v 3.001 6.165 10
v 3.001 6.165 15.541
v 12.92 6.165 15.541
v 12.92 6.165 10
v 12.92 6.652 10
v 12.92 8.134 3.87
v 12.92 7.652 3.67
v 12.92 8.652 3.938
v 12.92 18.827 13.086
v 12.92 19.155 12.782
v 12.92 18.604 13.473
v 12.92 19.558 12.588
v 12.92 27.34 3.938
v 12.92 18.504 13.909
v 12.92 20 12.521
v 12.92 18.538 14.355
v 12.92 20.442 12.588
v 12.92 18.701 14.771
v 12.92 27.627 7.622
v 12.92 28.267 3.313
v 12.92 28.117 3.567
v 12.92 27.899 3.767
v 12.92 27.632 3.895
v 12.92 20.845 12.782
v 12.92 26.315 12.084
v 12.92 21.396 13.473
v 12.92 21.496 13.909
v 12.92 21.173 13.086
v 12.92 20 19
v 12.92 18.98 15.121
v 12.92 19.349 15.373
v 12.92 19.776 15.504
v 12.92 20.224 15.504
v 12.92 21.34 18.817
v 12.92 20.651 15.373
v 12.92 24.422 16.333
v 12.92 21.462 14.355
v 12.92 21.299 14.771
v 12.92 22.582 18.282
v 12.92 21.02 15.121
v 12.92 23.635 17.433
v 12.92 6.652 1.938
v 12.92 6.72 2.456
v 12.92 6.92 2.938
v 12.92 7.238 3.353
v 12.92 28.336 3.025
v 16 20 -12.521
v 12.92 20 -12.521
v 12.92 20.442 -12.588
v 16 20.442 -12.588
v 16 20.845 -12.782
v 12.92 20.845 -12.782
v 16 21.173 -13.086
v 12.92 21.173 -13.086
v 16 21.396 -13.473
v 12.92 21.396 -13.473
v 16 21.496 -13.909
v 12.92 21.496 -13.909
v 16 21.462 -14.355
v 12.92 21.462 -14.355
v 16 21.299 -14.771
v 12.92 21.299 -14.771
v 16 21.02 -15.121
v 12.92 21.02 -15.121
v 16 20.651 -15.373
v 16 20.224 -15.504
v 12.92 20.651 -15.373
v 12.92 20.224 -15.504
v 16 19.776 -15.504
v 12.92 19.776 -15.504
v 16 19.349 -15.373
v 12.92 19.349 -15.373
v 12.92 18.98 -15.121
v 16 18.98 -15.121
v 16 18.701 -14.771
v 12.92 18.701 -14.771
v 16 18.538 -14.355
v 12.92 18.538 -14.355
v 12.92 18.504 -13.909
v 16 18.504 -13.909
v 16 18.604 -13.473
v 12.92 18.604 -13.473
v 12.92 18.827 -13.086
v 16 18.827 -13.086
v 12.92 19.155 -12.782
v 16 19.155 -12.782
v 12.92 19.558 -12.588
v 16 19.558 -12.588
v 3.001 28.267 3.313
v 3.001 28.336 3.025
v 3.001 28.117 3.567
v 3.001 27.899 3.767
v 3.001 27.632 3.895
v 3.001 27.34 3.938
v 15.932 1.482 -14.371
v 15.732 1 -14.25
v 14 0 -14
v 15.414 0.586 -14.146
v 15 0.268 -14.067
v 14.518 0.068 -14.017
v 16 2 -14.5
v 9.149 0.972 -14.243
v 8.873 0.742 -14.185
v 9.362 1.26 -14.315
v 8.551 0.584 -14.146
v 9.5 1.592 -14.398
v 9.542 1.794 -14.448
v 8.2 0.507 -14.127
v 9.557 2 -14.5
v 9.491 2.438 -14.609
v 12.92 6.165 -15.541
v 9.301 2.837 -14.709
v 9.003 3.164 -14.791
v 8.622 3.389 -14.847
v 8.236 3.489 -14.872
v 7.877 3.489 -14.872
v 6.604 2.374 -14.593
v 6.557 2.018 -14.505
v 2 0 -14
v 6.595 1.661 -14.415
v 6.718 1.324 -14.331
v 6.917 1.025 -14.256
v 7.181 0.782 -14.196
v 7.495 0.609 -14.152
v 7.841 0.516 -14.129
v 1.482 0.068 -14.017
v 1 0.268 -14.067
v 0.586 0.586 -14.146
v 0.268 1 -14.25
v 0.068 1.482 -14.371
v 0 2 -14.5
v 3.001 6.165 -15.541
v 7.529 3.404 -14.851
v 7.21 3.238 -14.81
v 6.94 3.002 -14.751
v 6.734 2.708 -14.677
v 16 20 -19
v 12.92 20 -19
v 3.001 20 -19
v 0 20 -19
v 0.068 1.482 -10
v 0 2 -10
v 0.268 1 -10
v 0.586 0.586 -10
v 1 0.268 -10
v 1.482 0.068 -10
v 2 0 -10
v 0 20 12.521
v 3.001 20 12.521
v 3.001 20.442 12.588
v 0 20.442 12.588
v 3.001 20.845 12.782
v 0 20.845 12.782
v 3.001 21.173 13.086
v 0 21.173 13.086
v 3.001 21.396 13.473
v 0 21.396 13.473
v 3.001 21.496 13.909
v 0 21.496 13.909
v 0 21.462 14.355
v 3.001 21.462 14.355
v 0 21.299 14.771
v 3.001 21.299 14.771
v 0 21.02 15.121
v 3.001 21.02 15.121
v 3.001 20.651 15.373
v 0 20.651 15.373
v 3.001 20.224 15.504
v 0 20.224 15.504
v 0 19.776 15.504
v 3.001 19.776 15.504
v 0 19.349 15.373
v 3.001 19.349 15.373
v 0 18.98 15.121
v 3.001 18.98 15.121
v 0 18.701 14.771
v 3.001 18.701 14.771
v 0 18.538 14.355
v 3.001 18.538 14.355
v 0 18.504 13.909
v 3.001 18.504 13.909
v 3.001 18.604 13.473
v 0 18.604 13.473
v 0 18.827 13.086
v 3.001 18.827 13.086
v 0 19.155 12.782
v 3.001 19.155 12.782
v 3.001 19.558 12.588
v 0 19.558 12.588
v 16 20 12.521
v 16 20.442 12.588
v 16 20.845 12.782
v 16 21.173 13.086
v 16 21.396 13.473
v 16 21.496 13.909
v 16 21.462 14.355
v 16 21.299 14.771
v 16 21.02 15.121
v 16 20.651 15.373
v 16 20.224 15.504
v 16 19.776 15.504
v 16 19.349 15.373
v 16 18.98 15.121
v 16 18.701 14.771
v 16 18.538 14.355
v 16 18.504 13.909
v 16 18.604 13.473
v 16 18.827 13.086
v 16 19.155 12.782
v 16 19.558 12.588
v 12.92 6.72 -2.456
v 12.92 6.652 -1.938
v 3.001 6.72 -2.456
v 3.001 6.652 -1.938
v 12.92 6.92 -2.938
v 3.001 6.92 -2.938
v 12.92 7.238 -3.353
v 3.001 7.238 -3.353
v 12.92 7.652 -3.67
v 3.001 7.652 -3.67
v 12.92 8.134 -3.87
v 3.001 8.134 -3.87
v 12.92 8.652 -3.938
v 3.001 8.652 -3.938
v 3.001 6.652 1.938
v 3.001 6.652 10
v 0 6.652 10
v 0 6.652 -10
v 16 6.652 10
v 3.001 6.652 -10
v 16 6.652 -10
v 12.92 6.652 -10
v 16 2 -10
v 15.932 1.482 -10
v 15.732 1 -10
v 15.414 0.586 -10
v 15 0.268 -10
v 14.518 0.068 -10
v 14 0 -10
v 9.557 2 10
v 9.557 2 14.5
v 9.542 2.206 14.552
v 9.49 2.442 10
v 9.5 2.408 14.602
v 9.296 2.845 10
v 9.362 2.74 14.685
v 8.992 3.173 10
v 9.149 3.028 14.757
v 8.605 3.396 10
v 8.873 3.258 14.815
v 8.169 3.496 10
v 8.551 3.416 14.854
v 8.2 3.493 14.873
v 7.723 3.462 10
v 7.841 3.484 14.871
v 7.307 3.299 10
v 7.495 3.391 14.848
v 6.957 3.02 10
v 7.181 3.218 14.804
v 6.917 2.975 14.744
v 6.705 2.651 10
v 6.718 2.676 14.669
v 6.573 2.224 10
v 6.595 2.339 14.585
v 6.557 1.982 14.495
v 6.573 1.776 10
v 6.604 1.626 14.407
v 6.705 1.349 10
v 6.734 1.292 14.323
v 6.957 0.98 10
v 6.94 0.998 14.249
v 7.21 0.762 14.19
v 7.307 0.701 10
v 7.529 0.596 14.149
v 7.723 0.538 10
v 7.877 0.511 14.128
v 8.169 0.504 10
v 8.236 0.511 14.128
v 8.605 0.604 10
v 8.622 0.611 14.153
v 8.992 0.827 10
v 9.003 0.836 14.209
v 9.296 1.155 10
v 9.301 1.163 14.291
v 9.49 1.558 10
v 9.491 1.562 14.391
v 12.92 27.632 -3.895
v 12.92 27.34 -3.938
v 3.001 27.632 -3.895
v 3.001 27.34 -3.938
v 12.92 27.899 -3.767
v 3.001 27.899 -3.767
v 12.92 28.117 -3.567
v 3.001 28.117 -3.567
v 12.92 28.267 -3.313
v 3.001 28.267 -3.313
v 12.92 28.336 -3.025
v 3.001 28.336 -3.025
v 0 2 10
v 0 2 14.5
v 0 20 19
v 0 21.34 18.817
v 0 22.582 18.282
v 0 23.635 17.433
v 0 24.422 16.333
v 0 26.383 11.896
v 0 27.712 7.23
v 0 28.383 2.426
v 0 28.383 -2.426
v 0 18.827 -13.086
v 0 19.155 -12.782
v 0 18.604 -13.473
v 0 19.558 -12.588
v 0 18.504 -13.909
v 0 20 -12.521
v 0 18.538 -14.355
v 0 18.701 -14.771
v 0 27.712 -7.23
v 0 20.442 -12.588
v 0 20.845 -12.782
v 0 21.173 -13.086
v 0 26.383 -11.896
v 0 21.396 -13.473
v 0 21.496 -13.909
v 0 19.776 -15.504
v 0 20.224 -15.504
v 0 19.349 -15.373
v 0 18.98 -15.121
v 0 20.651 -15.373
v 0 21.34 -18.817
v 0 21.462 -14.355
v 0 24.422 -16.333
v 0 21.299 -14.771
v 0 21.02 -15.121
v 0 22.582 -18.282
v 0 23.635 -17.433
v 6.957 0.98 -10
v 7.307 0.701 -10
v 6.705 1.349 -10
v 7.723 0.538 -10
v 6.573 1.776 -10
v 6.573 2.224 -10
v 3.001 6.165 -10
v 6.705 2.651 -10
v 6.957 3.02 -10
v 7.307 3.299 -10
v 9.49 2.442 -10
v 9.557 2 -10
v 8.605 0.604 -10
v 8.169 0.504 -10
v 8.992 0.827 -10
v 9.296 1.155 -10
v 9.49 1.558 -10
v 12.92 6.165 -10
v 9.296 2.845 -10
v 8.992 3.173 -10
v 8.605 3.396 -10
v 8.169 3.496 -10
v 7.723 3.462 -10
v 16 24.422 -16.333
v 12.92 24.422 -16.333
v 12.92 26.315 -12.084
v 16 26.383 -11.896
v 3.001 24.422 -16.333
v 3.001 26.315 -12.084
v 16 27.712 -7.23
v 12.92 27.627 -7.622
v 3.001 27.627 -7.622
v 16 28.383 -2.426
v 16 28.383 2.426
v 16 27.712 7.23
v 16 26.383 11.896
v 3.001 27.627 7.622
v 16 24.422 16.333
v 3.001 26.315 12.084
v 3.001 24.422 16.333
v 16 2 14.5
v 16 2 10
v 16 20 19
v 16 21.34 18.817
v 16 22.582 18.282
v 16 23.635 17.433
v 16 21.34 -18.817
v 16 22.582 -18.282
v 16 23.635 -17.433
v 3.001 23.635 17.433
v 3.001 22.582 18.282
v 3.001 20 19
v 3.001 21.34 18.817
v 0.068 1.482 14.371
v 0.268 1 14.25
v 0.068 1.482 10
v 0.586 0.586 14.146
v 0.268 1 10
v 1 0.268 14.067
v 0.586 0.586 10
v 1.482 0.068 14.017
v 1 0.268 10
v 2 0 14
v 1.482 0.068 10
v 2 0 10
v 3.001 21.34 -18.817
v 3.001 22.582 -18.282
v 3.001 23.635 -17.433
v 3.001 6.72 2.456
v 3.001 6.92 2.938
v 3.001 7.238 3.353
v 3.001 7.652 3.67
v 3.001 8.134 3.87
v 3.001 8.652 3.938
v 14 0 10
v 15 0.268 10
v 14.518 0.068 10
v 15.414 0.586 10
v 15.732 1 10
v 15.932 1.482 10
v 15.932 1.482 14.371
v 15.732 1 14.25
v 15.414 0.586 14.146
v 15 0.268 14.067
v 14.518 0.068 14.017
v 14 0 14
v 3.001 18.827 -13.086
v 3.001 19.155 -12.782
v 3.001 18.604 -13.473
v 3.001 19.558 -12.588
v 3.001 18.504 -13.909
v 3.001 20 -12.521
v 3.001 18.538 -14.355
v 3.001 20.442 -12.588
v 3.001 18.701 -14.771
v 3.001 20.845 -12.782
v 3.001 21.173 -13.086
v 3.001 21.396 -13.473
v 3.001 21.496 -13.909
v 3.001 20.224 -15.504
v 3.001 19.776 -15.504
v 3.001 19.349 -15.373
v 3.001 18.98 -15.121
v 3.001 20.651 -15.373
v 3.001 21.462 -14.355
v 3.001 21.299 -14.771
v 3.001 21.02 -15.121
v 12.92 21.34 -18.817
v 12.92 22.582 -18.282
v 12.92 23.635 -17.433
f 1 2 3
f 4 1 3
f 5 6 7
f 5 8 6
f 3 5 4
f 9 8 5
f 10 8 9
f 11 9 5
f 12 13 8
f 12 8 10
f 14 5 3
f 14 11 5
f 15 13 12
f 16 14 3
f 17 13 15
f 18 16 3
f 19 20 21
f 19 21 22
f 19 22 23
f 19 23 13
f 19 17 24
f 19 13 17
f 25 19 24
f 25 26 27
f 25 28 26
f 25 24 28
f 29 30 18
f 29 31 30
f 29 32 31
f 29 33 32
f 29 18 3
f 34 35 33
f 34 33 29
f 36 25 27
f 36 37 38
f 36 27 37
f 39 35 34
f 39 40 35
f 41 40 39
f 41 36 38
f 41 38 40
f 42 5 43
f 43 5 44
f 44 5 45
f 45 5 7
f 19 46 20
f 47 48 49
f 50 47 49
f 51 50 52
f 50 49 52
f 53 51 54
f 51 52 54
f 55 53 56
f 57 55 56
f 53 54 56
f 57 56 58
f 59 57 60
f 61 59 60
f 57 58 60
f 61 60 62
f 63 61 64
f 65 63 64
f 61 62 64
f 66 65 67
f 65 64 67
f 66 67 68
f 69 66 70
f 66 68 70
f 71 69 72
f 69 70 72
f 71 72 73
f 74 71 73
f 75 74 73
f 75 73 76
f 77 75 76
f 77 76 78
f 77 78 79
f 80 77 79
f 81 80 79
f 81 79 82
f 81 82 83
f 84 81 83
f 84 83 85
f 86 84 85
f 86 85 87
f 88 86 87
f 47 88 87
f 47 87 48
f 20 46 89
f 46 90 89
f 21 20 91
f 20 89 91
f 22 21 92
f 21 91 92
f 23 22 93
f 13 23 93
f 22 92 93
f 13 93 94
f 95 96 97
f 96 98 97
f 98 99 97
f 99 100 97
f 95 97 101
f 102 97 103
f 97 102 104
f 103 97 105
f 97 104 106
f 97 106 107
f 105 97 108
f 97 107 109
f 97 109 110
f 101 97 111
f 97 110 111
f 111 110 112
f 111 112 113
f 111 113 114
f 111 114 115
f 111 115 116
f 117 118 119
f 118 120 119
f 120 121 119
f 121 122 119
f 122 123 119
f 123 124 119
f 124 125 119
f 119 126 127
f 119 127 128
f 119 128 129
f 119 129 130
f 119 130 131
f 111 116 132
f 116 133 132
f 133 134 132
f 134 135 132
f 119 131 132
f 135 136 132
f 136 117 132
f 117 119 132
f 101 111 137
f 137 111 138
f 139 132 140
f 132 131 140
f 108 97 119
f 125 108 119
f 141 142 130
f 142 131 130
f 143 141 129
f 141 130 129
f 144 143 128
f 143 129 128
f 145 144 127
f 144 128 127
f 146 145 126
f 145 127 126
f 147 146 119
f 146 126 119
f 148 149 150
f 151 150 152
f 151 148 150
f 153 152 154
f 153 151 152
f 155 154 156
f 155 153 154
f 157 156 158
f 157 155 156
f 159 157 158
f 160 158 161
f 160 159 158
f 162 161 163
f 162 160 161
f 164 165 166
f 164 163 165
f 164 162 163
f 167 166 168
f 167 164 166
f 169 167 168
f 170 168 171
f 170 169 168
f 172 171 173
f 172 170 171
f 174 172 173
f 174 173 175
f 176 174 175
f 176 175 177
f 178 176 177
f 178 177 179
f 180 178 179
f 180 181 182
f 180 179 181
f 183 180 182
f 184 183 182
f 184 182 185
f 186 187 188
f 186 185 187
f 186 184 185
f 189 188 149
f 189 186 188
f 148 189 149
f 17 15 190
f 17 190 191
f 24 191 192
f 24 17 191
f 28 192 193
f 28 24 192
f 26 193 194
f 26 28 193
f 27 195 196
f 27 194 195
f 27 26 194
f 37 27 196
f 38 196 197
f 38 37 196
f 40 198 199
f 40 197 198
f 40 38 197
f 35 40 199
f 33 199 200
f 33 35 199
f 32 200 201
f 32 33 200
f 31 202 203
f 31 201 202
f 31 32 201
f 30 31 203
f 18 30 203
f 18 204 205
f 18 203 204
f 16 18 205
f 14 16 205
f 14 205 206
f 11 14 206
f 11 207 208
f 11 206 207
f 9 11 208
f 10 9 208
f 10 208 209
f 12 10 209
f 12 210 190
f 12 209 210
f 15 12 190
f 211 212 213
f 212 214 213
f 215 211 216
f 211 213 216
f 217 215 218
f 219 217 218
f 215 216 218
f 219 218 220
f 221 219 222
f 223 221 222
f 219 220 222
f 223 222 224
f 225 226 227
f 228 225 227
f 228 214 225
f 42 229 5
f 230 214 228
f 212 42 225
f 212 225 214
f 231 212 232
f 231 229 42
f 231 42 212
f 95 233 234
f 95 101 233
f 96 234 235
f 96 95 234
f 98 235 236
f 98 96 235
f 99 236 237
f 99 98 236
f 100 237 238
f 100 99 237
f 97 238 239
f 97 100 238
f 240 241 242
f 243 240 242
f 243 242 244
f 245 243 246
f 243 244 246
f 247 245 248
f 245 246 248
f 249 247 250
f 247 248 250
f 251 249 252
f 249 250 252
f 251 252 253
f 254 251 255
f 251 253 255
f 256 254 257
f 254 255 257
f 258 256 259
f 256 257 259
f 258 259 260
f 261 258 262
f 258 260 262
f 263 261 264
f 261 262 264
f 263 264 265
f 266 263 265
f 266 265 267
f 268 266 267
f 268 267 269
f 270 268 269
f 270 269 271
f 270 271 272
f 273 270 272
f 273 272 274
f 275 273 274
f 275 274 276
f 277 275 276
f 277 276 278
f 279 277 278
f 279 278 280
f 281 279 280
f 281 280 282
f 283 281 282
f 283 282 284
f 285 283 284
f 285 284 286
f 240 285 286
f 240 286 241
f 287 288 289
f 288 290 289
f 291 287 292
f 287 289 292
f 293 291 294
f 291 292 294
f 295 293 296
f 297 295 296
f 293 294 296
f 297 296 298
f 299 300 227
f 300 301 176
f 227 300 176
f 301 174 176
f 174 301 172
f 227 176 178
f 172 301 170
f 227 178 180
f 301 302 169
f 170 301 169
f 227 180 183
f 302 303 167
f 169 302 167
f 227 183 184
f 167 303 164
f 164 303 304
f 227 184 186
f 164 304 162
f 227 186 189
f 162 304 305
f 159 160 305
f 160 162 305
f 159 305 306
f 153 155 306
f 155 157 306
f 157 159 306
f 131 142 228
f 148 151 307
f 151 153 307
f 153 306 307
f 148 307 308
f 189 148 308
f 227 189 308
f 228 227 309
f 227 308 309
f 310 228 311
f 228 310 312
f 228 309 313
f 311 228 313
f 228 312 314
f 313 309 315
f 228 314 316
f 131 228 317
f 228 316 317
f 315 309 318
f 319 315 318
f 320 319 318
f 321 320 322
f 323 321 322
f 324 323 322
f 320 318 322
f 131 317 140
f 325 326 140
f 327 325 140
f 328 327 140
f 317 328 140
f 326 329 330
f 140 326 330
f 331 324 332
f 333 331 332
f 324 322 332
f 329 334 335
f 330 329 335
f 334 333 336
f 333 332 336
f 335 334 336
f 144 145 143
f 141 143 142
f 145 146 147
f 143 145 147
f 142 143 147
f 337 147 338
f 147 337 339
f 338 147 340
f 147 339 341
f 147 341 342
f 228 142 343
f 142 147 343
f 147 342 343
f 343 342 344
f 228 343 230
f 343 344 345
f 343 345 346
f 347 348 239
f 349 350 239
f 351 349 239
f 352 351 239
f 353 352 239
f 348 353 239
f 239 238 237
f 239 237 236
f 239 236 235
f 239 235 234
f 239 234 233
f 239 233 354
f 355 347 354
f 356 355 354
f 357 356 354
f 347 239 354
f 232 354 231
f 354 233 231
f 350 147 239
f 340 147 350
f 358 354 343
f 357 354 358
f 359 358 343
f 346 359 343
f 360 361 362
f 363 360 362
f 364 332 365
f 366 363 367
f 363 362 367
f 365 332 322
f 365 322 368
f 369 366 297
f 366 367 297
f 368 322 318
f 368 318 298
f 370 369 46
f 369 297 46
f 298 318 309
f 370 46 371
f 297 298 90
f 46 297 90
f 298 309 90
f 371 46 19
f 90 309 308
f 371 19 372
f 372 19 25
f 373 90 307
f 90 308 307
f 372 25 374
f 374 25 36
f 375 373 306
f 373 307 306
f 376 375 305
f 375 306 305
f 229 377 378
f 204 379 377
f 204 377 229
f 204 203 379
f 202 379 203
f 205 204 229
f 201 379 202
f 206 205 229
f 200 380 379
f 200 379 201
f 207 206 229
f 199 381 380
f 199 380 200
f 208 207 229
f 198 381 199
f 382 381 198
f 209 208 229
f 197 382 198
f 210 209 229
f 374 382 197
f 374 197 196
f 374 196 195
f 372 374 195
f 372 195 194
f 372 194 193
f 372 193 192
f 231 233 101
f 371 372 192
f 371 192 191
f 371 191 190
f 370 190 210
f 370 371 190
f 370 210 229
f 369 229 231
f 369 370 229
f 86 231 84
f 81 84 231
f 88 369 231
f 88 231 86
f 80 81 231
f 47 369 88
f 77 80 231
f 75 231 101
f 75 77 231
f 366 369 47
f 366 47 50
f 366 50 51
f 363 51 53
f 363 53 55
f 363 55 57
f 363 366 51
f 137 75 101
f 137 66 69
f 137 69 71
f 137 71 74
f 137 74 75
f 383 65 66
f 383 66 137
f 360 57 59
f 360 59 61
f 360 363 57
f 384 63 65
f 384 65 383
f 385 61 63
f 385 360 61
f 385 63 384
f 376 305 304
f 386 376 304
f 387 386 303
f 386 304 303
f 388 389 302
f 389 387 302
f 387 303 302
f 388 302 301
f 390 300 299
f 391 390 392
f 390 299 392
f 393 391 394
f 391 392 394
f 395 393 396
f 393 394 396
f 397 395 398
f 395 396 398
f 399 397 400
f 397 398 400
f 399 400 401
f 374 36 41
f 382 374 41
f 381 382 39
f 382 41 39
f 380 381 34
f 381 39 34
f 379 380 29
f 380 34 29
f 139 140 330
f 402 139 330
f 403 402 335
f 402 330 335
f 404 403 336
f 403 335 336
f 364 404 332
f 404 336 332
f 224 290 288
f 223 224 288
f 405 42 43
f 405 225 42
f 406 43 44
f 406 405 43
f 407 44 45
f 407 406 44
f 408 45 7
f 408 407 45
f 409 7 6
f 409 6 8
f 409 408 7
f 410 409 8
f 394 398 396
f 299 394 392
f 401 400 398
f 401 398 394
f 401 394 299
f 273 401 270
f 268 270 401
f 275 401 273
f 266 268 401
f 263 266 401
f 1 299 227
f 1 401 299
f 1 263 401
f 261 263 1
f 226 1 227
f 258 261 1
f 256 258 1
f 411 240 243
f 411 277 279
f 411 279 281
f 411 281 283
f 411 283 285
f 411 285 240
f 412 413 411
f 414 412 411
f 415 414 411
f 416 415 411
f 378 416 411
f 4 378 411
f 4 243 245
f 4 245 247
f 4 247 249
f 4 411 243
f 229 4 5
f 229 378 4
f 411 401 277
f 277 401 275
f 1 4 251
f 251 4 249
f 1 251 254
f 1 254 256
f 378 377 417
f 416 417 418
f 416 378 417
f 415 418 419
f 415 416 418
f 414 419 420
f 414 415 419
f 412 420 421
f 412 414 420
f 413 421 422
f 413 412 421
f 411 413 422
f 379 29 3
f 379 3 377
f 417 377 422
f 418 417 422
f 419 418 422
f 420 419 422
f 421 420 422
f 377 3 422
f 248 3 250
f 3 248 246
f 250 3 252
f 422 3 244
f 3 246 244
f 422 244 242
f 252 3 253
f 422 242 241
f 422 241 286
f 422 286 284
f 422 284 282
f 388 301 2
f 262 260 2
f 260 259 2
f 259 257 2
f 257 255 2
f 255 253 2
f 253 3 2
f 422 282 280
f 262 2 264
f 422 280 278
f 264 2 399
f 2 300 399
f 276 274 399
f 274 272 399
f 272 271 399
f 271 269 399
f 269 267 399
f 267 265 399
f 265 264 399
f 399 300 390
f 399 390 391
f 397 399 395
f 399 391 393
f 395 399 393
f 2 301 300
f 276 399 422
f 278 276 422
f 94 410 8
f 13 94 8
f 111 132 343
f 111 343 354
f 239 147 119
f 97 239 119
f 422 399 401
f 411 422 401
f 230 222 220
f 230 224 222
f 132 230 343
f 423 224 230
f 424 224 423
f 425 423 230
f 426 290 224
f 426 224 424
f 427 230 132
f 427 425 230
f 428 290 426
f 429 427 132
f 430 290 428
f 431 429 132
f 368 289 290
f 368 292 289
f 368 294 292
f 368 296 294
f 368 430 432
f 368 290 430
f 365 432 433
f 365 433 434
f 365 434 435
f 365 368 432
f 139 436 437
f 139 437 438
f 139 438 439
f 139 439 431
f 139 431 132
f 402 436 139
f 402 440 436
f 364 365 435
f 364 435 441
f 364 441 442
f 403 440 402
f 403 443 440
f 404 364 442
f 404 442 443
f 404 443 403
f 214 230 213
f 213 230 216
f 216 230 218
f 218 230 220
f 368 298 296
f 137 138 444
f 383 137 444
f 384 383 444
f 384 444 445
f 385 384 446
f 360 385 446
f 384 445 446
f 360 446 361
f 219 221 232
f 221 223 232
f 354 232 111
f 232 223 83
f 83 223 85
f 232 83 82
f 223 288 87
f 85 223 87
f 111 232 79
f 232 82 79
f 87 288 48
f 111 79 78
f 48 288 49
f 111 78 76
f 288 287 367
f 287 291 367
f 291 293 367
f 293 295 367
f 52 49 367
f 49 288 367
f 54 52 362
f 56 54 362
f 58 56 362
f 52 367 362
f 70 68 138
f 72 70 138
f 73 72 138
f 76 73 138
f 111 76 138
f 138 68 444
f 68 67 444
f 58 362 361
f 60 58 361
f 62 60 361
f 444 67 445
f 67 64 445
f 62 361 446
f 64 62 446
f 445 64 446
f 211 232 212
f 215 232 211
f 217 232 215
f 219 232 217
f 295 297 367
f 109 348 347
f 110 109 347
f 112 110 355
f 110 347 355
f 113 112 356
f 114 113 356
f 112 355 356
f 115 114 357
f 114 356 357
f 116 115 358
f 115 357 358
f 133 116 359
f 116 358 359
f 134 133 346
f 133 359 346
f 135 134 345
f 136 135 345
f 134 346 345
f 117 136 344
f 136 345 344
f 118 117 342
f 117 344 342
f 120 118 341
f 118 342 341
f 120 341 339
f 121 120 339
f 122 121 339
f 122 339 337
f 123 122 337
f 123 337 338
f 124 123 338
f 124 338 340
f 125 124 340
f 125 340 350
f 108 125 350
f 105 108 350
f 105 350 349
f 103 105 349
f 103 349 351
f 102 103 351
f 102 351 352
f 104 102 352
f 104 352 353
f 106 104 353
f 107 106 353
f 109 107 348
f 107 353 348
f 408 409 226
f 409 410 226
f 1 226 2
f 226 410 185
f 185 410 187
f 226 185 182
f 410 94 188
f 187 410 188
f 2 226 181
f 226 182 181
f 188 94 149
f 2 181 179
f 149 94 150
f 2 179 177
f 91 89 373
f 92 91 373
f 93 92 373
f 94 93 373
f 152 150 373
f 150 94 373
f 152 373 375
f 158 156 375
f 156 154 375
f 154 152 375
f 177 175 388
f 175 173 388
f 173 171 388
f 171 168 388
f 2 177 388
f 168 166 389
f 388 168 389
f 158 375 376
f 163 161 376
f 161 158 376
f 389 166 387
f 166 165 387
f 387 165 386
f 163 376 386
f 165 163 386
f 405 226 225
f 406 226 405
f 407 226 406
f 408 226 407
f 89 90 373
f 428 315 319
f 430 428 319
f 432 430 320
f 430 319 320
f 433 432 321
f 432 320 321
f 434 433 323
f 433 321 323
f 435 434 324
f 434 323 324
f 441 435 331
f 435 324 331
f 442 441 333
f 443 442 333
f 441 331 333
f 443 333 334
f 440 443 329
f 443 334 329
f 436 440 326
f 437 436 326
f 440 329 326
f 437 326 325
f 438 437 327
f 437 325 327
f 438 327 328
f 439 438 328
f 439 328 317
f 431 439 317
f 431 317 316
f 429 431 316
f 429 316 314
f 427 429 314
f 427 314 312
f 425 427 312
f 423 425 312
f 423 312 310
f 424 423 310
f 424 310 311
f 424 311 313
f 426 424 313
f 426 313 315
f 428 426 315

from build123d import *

# Parameters (mm, degrees)
BOSS_EXTRUDE1_DEPTH = 16
SKETCH4_W           = 20
SKETCH4_H           = 6.652028381
CUT_EXTRUDE1_DEPTH  = 17
SKETCH5_R           = 1.5
CUT_EXTRUDE2_DEPTH  = 17
SKETCH6_W           = 9.919414232
SKETCH6_H           = 19.005976718
CUT_EXTRUDE3_DEPTH  = 23
FILLET3_R           = 2
FILLET6_R           = 1
SKETCH7_R           = 1.5
CUT_EXTRUDE4_DEPTH  = 40.7726311
FILLET7_R           = 2


with BuildPart() as part:
    # Sketch3 → Boss-Extrude1 (new body)
    with BuildSketch(Plane(origin=(0, 0, 0), x_dir=(0, 0, -1), z_dir=(1, 0, 0))):
        with BuildLine():
            Line((-14, 0), (14, 0))
            Line((14, 0), (19, 20))
            ThreePointArc((19, 20), (18.281744193, 22.581988897), (16.333333333, 24.422166387))
            ThreePointArc((16.333333333, 24.422166387), (0, 28.467001677), (-16.333333333, 24.422166387))
            ThreePointArc((-16.333333333, 24.422166387), (-18.281744193, 22.581988897), (-19, 20))
            Line((-19, 20), (-14, 0))
        make_face()
    extrude(amount=BOSS_EXTRUDE1_DEPTH)

    # Sketch4 → Cut-Extrude1 (cut, through all)
    with BuildSketch(Plane(origin=(16, 0, 0), x_dir=(0, 0, -1), z_dir=(1, 0, 0))):
        with Locations((0, 3.326014191)):
            Rectangle(SKETCH4_W, SKETCH4_H)
    extrude(amount=-CUT_EXTRUDE1_DEPTH, mode=Mode.SUBTRACT)

    # Sketch5 → Cut-Extrude2 (cut, through all)
    with BuildSketch(Plane.ZY):
        with Locations((-14.02107691, 20)):
            Circle(SKETCH5_R)
    cut_extrude2 = extrude(amount=-CUT_EXTRUDE2_DEPTH, mode=Mode.SUBTRACT)

    # Mirror3: Cut-Extrude2 across plane
    add(cut_extrude2.mirror(Plane.XY), mode=Mode.SUBTRACT)

    # Sketch6 → Cut-Extrude3 (cut)
    with BuildSketch(Plane(origin=(0, 29.164714895, 0), x_dir=(1, 0, 0), z_dir=(0, 1, 0))):
        with Locations((7.960322343, 13.441432697)):
            Rectangle(SKETCH6_W, SKETCH6_H)
    cut_extrude3 = extrude(amount=-CUT_EXTRUDE3_DEPTH, mode=Mode.SUBTRACT)

    # Mirror4: Cut-Extrude3 across plane
    add(cut_extrude3.mirror(Plane.XY), mode=Mode.SUBTRACT)

    # Fillet3
    fillet3_edges = [part.edges().sort_by_distance(p)[0] for p in [
        (7.960322343, 6.652028381, -3.938444338),
        (7.960322343, 6.652028381, 3.938444338),
    ]]
    fillet(fillet3_edges, radius=FILLET3_R)

    # Fillet6
    fillet6_edges = [part.edges().sort_by_distance(p)[0] for p in [
        (7.960322343, 28.244705112, -3.938444338),
        (7.960322343, 28.244705112, 3.938444338),
    ]]
    fillet(fillet6_edges, radius=FILLET6_R)

    # Sketch7 → Cut-Extrude4 (cut, through all)
    with BuildSketch(Plane.XY.offset(20.7726311)):
        with Locations((8.056637232, 2)):
            Circle(SKETCH7_R)
    extrude(amount=-CUT_EXTRUDE4_DEPTH, mode=Mode.SUBTRACT)

    # Fillet7
    fillet7_edges = [part.edges().sort_by_distance(p)[0] for p in [
        (0, 0, -12),
        (16, 0, -12),
        (16, 0, 12),
        (0, 0, 12),
    ]]
    fillet(fillet7_edges, radius=FILLET7_R)


solid = part.part
